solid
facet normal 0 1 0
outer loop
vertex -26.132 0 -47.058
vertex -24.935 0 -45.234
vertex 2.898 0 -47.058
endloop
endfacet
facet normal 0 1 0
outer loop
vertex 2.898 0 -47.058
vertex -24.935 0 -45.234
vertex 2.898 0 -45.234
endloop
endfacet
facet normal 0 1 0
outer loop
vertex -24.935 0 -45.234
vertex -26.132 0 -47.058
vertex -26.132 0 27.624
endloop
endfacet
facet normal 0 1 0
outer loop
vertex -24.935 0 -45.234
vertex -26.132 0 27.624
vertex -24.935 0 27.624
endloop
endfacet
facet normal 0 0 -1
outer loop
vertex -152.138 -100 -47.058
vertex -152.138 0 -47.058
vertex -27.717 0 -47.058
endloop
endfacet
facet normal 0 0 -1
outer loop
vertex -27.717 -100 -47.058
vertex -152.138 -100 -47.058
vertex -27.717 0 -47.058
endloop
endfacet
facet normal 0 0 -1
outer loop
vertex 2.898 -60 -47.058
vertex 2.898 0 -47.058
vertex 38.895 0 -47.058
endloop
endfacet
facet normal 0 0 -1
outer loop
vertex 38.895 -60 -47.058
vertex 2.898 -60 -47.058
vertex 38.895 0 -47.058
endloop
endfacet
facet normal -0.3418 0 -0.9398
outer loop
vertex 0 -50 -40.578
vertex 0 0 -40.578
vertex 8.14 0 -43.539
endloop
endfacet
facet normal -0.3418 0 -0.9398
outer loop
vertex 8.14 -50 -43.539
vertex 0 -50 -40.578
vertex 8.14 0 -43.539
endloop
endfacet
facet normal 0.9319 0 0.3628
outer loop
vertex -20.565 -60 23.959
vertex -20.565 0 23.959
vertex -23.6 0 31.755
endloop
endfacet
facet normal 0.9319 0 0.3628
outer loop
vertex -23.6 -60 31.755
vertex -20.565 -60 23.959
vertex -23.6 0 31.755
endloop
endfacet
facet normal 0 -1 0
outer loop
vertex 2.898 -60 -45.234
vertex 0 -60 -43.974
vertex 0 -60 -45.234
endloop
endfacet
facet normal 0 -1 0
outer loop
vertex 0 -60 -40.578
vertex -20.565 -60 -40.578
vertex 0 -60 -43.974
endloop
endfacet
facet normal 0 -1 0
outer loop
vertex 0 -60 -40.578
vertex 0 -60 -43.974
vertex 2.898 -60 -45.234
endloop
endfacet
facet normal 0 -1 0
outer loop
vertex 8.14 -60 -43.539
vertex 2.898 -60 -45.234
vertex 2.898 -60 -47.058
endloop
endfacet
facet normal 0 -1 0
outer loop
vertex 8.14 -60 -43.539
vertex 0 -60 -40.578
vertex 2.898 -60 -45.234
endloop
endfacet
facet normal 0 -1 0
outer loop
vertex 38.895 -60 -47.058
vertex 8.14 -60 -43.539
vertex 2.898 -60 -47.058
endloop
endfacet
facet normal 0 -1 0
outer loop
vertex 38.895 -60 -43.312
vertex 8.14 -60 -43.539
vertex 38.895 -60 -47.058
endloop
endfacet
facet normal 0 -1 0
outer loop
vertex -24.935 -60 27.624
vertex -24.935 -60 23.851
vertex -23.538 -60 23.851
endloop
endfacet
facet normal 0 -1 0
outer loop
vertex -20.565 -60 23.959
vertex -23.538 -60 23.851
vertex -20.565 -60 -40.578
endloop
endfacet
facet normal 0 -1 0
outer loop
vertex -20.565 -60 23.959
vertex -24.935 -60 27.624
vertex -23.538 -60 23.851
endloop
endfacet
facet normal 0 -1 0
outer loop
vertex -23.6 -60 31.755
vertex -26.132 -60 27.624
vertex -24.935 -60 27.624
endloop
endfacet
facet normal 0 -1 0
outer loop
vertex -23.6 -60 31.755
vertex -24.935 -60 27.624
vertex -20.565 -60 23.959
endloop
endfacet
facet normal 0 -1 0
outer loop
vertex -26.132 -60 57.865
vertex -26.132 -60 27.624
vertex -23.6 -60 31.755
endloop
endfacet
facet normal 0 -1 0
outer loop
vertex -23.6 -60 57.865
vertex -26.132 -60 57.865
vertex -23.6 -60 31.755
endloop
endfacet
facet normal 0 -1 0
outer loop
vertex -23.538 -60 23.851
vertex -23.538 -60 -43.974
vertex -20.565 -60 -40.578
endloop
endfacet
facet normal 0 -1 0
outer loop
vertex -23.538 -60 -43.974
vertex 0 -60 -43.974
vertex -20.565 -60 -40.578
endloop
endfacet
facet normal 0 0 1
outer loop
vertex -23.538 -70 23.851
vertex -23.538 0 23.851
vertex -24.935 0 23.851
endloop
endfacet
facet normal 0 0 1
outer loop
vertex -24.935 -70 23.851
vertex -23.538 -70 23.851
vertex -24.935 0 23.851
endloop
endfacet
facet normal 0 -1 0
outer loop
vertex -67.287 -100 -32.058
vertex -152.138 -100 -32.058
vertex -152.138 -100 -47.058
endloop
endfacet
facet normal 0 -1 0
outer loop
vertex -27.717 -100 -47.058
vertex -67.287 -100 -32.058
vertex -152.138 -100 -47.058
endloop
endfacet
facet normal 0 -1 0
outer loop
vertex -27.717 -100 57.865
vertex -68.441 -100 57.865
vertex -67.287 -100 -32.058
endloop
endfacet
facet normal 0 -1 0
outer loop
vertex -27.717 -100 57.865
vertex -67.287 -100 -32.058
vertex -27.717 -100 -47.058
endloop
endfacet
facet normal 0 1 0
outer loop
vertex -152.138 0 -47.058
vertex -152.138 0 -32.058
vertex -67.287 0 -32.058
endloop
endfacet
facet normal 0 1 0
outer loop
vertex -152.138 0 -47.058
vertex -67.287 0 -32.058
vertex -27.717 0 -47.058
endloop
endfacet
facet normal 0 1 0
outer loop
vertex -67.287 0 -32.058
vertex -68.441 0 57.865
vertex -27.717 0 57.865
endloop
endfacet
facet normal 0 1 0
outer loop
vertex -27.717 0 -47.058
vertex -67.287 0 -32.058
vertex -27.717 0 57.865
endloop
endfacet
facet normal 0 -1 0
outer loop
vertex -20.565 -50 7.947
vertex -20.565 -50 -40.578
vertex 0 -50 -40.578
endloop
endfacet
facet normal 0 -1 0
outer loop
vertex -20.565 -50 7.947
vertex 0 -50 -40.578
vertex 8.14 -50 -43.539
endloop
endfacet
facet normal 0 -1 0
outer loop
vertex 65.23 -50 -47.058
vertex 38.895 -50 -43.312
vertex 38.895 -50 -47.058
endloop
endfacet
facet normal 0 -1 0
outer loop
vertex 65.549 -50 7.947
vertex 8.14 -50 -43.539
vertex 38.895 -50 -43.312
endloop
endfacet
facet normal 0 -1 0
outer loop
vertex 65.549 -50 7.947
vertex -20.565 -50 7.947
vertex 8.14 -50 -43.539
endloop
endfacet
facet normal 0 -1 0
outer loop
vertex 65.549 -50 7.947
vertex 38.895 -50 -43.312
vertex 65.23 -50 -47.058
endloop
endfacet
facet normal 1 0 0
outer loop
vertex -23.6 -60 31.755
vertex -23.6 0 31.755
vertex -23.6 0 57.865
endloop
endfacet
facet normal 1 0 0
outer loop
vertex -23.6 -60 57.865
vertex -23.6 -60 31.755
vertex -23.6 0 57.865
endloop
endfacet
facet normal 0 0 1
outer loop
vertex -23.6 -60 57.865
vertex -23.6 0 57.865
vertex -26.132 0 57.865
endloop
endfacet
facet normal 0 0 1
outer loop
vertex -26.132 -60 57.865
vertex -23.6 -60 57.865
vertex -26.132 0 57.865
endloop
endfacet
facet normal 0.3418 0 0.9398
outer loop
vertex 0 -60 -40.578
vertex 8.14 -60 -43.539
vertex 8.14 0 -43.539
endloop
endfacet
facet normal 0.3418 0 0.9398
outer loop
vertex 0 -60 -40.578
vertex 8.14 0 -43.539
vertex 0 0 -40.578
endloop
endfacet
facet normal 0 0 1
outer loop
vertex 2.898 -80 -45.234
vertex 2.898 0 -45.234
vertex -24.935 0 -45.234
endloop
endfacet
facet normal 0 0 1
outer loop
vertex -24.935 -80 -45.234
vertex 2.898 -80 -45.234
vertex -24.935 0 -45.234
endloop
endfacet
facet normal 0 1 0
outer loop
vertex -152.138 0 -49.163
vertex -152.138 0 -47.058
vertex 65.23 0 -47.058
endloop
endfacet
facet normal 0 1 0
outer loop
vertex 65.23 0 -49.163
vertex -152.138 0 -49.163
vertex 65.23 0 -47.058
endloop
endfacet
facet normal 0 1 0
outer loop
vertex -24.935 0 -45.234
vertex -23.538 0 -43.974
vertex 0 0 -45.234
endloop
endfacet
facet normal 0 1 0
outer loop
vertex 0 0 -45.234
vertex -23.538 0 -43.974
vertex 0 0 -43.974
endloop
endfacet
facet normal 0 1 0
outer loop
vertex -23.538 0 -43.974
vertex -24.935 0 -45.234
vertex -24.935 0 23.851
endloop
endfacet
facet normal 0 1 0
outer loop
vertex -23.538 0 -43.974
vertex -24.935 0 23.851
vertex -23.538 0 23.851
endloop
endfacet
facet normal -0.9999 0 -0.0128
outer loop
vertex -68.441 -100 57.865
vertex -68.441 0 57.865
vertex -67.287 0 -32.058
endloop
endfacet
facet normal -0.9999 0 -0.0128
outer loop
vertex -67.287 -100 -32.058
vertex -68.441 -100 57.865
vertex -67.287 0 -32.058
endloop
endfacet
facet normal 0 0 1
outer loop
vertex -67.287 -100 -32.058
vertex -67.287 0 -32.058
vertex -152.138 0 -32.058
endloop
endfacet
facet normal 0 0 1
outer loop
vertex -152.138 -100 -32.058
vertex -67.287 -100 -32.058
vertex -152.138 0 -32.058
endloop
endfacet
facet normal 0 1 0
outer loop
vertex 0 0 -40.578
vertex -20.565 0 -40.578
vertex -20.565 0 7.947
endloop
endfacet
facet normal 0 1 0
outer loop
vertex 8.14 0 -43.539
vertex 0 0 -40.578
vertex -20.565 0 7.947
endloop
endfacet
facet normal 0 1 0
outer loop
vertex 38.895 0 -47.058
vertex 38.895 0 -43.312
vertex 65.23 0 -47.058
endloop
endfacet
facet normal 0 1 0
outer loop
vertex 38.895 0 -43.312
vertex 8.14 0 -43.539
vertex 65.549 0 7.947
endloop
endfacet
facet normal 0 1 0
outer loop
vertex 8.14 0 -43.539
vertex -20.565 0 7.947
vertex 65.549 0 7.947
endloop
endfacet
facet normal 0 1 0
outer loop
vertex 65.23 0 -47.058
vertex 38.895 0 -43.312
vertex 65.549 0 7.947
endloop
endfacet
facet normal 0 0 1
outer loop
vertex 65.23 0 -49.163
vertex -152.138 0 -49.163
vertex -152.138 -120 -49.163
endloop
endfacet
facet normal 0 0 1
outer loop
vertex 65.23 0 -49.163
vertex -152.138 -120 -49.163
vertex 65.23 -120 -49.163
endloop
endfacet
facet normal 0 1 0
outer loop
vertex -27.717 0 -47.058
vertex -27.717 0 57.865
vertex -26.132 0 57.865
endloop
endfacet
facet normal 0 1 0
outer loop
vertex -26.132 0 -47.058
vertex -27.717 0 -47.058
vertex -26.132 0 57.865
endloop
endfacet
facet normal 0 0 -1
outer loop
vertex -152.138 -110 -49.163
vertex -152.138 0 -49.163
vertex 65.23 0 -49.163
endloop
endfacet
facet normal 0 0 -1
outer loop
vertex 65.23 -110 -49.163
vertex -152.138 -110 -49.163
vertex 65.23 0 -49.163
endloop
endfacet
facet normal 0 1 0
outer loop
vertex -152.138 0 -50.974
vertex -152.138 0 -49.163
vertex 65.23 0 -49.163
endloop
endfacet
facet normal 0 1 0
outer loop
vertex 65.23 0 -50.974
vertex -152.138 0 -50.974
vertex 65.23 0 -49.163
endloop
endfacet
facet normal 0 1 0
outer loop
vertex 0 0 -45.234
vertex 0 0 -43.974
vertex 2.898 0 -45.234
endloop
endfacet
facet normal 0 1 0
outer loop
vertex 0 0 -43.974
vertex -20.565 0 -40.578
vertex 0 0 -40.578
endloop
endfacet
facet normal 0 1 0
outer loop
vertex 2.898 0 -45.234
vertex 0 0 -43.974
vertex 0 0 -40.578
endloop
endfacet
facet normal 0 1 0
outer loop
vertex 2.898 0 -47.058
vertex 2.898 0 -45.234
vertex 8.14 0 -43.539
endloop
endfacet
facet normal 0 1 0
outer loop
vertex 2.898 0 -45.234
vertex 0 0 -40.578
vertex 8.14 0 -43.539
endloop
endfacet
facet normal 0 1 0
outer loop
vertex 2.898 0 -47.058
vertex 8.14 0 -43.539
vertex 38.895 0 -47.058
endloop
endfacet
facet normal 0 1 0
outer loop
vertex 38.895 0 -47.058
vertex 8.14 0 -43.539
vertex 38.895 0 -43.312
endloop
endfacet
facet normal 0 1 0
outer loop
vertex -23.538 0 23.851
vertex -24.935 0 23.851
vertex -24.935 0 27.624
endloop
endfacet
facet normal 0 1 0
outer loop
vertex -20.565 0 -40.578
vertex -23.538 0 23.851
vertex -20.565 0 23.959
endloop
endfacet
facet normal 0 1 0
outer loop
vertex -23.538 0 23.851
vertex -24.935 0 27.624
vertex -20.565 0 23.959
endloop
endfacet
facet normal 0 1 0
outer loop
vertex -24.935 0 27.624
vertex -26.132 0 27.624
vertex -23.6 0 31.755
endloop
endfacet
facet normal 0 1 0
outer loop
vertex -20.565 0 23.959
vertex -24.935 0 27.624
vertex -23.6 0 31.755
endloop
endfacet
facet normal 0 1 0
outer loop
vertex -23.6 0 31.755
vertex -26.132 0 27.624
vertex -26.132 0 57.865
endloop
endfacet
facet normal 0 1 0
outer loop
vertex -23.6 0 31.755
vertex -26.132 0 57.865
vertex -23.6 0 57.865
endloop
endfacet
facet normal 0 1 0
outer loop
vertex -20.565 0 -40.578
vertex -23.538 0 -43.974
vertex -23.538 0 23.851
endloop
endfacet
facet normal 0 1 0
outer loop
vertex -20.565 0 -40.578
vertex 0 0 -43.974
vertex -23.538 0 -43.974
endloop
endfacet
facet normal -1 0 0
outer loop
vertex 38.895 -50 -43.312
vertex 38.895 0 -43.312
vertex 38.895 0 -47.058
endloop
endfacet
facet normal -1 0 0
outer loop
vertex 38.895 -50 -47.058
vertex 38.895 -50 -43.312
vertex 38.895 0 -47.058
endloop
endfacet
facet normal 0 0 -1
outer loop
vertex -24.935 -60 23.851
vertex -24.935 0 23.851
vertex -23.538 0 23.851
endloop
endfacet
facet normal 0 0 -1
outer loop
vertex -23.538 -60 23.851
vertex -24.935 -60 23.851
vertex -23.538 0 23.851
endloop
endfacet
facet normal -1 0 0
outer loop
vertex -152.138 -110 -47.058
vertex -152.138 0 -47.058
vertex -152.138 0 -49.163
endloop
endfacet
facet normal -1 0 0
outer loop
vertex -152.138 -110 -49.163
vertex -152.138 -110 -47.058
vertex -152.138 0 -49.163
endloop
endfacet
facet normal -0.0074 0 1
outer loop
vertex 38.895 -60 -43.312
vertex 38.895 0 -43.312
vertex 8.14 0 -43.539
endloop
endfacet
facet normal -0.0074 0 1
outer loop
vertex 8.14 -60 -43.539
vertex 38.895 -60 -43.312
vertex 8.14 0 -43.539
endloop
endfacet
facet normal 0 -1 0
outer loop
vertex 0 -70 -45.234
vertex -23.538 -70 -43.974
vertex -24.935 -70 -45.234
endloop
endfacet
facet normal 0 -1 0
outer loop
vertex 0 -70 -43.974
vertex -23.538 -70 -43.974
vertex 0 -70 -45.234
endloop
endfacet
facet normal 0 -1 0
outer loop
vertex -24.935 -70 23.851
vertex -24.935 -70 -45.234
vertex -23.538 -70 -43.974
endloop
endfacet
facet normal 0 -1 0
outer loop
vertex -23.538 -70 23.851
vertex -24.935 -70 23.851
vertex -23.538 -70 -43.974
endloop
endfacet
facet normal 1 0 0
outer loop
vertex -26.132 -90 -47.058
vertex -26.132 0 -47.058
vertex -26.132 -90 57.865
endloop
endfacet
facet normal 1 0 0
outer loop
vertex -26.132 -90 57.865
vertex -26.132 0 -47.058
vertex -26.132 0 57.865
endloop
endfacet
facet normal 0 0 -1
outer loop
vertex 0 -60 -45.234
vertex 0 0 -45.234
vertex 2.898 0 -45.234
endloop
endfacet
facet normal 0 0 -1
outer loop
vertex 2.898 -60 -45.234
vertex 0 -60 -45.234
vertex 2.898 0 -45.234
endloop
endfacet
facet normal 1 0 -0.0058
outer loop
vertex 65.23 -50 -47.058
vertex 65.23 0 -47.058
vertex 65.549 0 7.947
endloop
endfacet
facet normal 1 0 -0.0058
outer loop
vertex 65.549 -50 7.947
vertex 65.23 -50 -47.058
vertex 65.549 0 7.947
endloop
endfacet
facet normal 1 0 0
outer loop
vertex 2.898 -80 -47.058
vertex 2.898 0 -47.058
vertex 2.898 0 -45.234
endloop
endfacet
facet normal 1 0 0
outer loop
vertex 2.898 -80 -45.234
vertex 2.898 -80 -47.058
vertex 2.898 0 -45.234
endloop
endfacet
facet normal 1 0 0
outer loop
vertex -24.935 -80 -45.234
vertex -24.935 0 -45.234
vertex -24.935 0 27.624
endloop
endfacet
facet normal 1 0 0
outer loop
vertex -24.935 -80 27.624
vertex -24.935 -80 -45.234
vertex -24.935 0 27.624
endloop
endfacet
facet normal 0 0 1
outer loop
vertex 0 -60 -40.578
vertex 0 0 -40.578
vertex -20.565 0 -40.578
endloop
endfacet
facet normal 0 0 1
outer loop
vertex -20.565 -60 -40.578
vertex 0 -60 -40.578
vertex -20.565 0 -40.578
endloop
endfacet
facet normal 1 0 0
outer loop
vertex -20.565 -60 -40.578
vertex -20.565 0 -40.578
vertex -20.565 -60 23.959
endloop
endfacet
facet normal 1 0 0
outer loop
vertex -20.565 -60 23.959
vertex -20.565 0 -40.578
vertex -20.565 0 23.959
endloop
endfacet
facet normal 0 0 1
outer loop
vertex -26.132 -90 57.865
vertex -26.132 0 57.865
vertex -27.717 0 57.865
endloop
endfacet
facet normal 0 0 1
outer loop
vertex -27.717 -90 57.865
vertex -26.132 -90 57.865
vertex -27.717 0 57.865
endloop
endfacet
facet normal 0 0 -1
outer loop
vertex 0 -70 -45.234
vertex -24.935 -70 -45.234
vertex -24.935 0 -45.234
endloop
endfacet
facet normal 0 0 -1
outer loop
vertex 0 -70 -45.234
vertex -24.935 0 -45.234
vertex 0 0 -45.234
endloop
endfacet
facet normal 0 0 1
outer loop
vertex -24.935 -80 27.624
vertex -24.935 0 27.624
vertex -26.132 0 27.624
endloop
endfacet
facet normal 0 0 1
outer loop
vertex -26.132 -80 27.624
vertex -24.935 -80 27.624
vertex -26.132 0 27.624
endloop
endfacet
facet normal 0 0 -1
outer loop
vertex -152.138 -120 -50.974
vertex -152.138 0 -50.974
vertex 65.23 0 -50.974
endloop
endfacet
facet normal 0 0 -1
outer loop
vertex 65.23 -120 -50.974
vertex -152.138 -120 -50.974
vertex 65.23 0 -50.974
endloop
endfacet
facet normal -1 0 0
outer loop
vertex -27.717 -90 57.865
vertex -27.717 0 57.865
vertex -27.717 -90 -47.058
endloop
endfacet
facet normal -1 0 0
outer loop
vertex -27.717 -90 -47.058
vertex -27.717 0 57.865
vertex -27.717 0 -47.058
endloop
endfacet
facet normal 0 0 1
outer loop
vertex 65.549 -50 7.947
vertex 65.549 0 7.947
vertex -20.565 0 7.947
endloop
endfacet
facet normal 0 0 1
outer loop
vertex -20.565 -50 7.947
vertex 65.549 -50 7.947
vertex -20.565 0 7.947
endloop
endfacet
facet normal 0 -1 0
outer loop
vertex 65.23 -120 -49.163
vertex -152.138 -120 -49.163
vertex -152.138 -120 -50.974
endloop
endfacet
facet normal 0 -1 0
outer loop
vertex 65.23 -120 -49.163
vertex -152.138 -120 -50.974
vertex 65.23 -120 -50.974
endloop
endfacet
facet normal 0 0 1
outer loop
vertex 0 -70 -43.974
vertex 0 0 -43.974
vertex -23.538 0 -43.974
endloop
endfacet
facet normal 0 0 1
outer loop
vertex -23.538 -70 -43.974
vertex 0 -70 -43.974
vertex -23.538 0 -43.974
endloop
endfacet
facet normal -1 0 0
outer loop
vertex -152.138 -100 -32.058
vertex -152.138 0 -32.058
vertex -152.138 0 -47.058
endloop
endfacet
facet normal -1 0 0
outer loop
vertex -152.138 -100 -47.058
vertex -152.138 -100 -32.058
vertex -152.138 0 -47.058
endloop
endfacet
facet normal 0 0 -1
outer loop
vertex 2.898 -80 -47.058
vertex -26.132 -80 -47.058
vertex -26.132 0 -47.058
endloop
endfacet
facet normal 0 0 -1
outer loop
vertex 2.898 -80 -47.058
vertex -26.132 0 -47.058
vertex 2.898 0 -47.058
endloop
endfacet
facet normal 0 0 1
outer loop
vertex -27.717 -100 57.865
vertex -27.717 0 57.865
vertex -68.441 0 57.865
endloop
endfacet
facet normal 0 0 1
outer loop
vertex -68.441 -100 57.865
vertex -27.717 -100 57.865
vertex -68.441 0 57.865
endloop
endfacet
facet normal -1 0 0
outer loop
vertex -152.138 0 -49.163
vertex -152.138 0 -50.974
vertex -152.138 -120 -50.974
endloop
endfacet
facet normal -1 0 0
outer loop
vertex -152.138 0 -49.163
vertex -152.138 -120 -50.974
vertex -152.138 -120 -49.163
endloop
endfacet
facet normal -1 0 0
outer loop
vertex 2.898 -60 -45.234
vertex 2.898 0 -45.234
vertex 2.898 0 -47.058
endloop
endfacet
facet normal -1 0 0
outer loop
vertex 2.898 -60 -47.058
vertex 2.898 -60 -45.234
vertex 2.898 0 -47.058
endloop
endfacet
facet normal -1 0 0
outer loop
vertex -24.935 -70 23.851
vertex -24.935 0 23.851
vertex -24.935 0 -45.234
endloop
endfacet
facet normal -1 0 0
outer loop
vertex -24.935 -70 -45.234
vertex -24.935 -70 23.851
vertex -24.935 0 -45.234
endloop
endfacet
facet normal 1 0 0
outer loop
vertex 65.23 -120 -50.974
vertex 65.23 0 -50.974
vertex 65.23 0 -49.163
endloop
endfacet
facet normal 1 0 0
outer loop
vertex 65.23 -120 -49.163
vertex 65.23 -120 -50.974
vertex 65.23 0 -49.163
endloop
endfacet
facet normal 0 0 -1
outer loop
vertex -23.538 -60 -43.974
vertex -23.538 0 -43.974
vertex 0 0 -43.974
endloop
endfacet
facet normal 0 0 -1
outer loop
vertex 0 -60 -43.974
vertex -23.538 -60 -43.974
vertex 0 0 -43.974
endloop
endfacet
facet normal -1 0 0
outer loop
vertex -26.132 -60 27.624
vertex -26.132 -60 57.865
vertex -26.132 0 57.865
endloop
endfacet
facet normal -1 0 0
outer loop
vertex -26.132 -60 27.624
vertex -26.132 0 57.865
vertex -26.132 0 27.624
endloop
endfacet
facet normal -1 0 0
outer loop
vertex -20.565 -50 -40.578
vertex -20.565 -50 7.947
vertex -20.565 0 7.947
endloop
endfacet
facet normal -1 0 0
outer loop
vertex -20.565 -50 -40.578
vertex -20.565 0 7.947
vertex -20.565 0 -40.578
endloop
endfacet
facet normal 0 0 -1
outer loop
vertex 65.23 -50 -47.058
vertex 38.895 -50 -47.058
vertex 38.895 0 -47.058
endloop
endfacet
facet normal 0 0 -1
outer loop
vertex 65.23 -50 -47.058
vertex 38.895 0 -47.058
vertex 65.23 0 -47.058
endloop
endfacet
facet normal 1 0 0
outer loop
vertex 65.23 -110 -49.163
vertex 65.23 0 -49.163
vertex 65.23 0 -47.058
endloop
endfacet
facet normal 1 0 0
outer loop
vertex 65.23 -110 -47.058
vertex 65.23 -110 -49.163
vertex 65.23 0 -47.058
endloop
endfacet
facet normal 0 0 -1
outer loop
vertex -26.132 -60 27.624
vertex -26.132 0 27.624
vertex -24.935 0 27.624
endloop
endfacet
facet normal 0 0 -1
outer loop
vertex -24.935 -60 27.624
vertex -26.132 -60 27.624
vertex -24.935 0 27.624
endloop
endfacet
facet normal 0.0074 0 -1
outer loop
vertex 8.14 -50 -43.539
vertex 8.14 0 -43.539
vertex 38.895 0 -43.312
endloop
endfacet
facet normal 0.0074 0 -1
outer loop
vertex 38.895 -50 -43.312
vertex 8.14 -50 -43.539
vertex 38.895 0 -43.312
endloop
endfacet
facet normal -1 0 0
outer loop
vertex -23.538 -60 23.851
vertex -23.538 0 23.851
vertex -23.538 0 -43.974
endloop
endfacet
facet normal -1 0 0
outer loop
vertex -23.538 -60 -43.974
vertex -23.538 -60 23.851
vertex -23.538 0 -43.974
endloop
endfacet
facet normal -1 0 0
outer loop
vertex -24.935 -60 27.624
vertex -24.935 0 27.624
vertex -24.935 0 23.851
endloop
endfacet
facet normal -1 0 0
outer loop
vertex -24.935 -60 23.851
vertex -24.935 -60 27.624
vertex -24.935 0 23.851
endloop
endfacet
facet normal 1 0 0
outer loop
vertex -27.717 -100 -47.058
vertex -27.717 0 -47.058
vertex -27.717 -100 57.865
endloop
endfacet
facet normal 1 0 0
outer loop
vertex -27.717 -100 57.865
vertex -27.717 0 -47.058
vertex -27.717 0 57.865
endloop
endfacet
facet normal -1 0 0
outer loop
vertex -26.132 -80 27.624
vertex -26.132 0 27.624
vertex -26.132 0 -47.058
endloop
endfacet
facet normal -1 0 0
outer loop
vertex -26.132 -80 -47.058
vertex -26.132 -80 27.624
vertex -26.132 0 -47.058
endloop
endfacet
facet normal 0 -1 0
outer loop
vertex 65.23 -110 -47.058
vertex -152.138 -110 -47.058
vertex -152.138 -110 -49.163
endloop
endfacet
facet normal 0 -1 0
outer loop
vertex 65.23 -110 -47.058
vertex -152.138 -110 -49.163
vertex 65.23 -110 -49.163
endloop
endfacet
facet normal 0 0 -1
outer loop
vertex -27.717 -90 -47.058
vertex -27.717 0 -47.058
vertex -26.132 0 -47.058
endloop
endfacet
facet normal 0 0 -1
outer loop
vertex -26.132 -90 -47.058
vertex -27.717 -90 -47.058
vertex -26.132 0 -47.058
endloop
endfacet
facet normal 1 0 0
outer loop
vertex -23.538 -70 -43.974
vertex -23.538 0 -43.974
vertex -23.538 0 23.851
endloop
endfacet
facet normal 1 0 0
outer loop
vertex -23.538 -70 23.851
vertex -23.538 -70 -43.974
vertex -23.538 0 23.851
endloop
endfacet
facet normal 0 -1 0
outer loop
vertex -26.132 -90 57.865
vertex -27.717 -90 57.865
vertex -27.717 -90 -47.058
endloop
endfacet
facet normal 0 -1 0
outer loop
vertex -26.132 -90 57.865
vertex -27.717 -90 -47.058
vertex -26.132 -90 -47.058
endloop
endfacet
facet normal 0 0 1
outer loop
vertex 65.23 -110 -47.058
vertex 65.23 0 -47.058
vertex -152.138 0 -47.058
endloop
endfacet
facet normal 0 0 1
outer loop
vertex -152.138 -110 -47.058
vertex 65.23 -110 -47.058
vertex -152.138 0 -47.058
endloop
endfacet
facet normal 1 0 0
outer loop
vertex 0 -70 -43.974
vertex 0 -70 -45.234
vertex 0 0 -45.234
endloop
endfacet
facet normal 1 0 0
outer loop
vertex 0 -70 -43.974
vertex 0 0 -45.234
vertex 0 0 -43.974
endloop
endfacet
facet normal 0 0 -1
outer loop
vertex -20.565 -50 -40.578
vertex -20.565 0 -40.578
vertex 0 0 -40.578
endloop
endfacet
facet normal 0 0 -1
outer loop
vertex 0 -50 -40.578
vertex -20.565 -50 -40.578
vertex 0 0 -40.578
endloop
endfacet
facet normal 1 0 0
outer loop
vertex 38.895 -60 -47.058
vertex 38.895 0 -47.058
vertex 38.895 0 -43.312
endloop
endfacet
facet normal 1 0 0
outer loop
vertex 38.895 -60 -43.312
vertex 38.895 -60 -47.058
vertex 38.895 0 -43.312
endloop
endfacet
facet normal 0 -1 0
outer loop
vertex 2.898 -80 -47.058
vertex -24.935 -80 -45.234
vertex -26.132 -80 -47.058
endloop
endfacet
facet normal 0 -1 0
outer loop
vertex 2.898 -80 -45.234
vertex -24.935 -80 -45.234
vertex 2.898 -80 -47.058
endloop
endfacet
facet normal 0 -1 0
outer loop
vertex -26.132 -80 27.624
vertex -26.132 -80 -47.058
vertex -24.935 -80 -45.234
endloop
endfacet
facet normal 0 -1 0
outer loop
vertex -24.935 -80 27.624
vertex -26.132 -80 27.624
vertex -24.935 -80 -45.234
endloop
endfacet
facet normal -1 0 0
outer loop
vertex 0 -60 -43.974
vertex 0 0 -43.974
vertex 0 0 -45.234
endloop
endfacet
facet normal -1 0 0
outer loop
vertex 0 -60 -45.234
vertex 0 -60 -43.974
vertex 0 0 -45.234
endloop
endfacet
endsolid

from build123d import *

# Parameters (mm, degrees)
F1_DEPTH = 100
F2_DEPTH = 110
F0_W     = 217.36748
F0_H     = 1.811132
F3_DEPTH = 120
F4_DEPTH = 90
F5_DEPTH = 80
F6_DEPTH = 70
F7_DEPTH = 60
F8_DEPTH = 50


with BuildPart() as f1:
    # F0 (on Front) → F1 (new body)
    with BuildSketch(Plane.XZ):
        Polygon((-27.717119, 57.864746), (-68.44143, 57.864746), (-67.286856, -32.058271), (-152.137729, -32.058271), (-152.137729, -47.058271), (-27.717119, -47.058271), align=None)
    extrude(amount=F1_DEPTH)


with BuildPart() as f2:
    # F0 (on Front) → F2 (new body)
    with BuildSketch(Plane.XZ):
        Polygon((-26.13158, -47.058271), (-27.717119, -47.058271), (-152.137729, -47.058271), (-152.137729, -49.16336), (65.229751, -49.16336), (65.229751, -47.058271), (38.894936, -47.058271), (2.898001, -47.058271), align=None)
    extrude(amount=F2_DEPTH)


with BuildPart() as f3:
    # F0 (on Front) → F3 (new body)
    with BuildSketch(Plane.XZ):
        with Locations((-43.453989, -50.068926)):
            Rectangle(F0_W, F0_H)
    extrude(amount=F3_DEPTH)


with BuildPart() as f4:
    # F0 (on Front) → F4 (new body)
    with BuildSketch(Plane.XZ):
        Polygon((-26.13158, 57.864746), (-27.717119, 57.864746), (-27.717119, -47.058271), (-26.13158, -47.058271), (-26.13158, 27.62443), align=None)
    extrude(amount=F4_DEPTH)


with BuildPart() as f5:
    # F0 (on Front) → F5 (new body)
    with BuildSketch(Plane.XZ):
        Polygon((-26.13158, 27.62443), (-26.13158, -47.058271), (2.898001, -47.058271), (2.898001, -45.234002), (0, -45.234002), (-24.935156, -45.234002), (-24.935156, 23.850781), (-24.935156, 27.62443), align=None)
    extrude(amount=F5_DEPTH)


with BuildPart() as f6:
    # F0 (on Front) → F6 (new body)
    with BuildSketch(Plane.XZ):
        Polygon((-23.537509, 23.850781), (-24.935156, 23.850781), (-24.935156, -45.234002), (0, -45.234002), (0, -43.974001), (-23.537509, -43.974001), align=None)
    extrude(amount=F6_DEPTH)


with BuildPart() as f7:
    # F0 (on Front) → F7 (new body)
    with BuildSketch(Plane.XZ):
        Polygon((-23.599576, 57.864746), (-26.13158, 57.864746), (-26.13158, 27.62443), (-24.935156, 27.62443), (-24.935156, 23.850781), (-23.537509, 23.850781), (-23.537509, -43.974001), (0, -43.974001), (0, -45.234002), (2.898001, -45.234002), (2.898001, -47.058271), (38.894936, -47.058271), (38.894936, -43.311607), (8.139933, -43.539423), (0, -40.577829), (-20.564739, -40.577829), (-20.564739, 7.946733), (-20.564739, 23.95942), (-23.599576, 31.755088), align=None)
    extrude(amount=F7_DEPTH)


with BuildPart() as f8:
    # F0 (on Front) → F8 (new body)
    with BuildSketch(Plane.XZ):
        Polygon((38.894936, -43.311607), (38.894936, -47.058271), (65.229751, -47.058271), (65.549262, 7.946733), (-20.564739, 7.946733), (-20.564739, -40.577829), (0, -40.577829), (8.139933, -43.539423), align=None)
    extrude(amount=F8_DEPTH)


solid = Compound([f1.part, f2.part, f3.part, f4.part, f5.part, f6.part, f7.part, f8.part])
